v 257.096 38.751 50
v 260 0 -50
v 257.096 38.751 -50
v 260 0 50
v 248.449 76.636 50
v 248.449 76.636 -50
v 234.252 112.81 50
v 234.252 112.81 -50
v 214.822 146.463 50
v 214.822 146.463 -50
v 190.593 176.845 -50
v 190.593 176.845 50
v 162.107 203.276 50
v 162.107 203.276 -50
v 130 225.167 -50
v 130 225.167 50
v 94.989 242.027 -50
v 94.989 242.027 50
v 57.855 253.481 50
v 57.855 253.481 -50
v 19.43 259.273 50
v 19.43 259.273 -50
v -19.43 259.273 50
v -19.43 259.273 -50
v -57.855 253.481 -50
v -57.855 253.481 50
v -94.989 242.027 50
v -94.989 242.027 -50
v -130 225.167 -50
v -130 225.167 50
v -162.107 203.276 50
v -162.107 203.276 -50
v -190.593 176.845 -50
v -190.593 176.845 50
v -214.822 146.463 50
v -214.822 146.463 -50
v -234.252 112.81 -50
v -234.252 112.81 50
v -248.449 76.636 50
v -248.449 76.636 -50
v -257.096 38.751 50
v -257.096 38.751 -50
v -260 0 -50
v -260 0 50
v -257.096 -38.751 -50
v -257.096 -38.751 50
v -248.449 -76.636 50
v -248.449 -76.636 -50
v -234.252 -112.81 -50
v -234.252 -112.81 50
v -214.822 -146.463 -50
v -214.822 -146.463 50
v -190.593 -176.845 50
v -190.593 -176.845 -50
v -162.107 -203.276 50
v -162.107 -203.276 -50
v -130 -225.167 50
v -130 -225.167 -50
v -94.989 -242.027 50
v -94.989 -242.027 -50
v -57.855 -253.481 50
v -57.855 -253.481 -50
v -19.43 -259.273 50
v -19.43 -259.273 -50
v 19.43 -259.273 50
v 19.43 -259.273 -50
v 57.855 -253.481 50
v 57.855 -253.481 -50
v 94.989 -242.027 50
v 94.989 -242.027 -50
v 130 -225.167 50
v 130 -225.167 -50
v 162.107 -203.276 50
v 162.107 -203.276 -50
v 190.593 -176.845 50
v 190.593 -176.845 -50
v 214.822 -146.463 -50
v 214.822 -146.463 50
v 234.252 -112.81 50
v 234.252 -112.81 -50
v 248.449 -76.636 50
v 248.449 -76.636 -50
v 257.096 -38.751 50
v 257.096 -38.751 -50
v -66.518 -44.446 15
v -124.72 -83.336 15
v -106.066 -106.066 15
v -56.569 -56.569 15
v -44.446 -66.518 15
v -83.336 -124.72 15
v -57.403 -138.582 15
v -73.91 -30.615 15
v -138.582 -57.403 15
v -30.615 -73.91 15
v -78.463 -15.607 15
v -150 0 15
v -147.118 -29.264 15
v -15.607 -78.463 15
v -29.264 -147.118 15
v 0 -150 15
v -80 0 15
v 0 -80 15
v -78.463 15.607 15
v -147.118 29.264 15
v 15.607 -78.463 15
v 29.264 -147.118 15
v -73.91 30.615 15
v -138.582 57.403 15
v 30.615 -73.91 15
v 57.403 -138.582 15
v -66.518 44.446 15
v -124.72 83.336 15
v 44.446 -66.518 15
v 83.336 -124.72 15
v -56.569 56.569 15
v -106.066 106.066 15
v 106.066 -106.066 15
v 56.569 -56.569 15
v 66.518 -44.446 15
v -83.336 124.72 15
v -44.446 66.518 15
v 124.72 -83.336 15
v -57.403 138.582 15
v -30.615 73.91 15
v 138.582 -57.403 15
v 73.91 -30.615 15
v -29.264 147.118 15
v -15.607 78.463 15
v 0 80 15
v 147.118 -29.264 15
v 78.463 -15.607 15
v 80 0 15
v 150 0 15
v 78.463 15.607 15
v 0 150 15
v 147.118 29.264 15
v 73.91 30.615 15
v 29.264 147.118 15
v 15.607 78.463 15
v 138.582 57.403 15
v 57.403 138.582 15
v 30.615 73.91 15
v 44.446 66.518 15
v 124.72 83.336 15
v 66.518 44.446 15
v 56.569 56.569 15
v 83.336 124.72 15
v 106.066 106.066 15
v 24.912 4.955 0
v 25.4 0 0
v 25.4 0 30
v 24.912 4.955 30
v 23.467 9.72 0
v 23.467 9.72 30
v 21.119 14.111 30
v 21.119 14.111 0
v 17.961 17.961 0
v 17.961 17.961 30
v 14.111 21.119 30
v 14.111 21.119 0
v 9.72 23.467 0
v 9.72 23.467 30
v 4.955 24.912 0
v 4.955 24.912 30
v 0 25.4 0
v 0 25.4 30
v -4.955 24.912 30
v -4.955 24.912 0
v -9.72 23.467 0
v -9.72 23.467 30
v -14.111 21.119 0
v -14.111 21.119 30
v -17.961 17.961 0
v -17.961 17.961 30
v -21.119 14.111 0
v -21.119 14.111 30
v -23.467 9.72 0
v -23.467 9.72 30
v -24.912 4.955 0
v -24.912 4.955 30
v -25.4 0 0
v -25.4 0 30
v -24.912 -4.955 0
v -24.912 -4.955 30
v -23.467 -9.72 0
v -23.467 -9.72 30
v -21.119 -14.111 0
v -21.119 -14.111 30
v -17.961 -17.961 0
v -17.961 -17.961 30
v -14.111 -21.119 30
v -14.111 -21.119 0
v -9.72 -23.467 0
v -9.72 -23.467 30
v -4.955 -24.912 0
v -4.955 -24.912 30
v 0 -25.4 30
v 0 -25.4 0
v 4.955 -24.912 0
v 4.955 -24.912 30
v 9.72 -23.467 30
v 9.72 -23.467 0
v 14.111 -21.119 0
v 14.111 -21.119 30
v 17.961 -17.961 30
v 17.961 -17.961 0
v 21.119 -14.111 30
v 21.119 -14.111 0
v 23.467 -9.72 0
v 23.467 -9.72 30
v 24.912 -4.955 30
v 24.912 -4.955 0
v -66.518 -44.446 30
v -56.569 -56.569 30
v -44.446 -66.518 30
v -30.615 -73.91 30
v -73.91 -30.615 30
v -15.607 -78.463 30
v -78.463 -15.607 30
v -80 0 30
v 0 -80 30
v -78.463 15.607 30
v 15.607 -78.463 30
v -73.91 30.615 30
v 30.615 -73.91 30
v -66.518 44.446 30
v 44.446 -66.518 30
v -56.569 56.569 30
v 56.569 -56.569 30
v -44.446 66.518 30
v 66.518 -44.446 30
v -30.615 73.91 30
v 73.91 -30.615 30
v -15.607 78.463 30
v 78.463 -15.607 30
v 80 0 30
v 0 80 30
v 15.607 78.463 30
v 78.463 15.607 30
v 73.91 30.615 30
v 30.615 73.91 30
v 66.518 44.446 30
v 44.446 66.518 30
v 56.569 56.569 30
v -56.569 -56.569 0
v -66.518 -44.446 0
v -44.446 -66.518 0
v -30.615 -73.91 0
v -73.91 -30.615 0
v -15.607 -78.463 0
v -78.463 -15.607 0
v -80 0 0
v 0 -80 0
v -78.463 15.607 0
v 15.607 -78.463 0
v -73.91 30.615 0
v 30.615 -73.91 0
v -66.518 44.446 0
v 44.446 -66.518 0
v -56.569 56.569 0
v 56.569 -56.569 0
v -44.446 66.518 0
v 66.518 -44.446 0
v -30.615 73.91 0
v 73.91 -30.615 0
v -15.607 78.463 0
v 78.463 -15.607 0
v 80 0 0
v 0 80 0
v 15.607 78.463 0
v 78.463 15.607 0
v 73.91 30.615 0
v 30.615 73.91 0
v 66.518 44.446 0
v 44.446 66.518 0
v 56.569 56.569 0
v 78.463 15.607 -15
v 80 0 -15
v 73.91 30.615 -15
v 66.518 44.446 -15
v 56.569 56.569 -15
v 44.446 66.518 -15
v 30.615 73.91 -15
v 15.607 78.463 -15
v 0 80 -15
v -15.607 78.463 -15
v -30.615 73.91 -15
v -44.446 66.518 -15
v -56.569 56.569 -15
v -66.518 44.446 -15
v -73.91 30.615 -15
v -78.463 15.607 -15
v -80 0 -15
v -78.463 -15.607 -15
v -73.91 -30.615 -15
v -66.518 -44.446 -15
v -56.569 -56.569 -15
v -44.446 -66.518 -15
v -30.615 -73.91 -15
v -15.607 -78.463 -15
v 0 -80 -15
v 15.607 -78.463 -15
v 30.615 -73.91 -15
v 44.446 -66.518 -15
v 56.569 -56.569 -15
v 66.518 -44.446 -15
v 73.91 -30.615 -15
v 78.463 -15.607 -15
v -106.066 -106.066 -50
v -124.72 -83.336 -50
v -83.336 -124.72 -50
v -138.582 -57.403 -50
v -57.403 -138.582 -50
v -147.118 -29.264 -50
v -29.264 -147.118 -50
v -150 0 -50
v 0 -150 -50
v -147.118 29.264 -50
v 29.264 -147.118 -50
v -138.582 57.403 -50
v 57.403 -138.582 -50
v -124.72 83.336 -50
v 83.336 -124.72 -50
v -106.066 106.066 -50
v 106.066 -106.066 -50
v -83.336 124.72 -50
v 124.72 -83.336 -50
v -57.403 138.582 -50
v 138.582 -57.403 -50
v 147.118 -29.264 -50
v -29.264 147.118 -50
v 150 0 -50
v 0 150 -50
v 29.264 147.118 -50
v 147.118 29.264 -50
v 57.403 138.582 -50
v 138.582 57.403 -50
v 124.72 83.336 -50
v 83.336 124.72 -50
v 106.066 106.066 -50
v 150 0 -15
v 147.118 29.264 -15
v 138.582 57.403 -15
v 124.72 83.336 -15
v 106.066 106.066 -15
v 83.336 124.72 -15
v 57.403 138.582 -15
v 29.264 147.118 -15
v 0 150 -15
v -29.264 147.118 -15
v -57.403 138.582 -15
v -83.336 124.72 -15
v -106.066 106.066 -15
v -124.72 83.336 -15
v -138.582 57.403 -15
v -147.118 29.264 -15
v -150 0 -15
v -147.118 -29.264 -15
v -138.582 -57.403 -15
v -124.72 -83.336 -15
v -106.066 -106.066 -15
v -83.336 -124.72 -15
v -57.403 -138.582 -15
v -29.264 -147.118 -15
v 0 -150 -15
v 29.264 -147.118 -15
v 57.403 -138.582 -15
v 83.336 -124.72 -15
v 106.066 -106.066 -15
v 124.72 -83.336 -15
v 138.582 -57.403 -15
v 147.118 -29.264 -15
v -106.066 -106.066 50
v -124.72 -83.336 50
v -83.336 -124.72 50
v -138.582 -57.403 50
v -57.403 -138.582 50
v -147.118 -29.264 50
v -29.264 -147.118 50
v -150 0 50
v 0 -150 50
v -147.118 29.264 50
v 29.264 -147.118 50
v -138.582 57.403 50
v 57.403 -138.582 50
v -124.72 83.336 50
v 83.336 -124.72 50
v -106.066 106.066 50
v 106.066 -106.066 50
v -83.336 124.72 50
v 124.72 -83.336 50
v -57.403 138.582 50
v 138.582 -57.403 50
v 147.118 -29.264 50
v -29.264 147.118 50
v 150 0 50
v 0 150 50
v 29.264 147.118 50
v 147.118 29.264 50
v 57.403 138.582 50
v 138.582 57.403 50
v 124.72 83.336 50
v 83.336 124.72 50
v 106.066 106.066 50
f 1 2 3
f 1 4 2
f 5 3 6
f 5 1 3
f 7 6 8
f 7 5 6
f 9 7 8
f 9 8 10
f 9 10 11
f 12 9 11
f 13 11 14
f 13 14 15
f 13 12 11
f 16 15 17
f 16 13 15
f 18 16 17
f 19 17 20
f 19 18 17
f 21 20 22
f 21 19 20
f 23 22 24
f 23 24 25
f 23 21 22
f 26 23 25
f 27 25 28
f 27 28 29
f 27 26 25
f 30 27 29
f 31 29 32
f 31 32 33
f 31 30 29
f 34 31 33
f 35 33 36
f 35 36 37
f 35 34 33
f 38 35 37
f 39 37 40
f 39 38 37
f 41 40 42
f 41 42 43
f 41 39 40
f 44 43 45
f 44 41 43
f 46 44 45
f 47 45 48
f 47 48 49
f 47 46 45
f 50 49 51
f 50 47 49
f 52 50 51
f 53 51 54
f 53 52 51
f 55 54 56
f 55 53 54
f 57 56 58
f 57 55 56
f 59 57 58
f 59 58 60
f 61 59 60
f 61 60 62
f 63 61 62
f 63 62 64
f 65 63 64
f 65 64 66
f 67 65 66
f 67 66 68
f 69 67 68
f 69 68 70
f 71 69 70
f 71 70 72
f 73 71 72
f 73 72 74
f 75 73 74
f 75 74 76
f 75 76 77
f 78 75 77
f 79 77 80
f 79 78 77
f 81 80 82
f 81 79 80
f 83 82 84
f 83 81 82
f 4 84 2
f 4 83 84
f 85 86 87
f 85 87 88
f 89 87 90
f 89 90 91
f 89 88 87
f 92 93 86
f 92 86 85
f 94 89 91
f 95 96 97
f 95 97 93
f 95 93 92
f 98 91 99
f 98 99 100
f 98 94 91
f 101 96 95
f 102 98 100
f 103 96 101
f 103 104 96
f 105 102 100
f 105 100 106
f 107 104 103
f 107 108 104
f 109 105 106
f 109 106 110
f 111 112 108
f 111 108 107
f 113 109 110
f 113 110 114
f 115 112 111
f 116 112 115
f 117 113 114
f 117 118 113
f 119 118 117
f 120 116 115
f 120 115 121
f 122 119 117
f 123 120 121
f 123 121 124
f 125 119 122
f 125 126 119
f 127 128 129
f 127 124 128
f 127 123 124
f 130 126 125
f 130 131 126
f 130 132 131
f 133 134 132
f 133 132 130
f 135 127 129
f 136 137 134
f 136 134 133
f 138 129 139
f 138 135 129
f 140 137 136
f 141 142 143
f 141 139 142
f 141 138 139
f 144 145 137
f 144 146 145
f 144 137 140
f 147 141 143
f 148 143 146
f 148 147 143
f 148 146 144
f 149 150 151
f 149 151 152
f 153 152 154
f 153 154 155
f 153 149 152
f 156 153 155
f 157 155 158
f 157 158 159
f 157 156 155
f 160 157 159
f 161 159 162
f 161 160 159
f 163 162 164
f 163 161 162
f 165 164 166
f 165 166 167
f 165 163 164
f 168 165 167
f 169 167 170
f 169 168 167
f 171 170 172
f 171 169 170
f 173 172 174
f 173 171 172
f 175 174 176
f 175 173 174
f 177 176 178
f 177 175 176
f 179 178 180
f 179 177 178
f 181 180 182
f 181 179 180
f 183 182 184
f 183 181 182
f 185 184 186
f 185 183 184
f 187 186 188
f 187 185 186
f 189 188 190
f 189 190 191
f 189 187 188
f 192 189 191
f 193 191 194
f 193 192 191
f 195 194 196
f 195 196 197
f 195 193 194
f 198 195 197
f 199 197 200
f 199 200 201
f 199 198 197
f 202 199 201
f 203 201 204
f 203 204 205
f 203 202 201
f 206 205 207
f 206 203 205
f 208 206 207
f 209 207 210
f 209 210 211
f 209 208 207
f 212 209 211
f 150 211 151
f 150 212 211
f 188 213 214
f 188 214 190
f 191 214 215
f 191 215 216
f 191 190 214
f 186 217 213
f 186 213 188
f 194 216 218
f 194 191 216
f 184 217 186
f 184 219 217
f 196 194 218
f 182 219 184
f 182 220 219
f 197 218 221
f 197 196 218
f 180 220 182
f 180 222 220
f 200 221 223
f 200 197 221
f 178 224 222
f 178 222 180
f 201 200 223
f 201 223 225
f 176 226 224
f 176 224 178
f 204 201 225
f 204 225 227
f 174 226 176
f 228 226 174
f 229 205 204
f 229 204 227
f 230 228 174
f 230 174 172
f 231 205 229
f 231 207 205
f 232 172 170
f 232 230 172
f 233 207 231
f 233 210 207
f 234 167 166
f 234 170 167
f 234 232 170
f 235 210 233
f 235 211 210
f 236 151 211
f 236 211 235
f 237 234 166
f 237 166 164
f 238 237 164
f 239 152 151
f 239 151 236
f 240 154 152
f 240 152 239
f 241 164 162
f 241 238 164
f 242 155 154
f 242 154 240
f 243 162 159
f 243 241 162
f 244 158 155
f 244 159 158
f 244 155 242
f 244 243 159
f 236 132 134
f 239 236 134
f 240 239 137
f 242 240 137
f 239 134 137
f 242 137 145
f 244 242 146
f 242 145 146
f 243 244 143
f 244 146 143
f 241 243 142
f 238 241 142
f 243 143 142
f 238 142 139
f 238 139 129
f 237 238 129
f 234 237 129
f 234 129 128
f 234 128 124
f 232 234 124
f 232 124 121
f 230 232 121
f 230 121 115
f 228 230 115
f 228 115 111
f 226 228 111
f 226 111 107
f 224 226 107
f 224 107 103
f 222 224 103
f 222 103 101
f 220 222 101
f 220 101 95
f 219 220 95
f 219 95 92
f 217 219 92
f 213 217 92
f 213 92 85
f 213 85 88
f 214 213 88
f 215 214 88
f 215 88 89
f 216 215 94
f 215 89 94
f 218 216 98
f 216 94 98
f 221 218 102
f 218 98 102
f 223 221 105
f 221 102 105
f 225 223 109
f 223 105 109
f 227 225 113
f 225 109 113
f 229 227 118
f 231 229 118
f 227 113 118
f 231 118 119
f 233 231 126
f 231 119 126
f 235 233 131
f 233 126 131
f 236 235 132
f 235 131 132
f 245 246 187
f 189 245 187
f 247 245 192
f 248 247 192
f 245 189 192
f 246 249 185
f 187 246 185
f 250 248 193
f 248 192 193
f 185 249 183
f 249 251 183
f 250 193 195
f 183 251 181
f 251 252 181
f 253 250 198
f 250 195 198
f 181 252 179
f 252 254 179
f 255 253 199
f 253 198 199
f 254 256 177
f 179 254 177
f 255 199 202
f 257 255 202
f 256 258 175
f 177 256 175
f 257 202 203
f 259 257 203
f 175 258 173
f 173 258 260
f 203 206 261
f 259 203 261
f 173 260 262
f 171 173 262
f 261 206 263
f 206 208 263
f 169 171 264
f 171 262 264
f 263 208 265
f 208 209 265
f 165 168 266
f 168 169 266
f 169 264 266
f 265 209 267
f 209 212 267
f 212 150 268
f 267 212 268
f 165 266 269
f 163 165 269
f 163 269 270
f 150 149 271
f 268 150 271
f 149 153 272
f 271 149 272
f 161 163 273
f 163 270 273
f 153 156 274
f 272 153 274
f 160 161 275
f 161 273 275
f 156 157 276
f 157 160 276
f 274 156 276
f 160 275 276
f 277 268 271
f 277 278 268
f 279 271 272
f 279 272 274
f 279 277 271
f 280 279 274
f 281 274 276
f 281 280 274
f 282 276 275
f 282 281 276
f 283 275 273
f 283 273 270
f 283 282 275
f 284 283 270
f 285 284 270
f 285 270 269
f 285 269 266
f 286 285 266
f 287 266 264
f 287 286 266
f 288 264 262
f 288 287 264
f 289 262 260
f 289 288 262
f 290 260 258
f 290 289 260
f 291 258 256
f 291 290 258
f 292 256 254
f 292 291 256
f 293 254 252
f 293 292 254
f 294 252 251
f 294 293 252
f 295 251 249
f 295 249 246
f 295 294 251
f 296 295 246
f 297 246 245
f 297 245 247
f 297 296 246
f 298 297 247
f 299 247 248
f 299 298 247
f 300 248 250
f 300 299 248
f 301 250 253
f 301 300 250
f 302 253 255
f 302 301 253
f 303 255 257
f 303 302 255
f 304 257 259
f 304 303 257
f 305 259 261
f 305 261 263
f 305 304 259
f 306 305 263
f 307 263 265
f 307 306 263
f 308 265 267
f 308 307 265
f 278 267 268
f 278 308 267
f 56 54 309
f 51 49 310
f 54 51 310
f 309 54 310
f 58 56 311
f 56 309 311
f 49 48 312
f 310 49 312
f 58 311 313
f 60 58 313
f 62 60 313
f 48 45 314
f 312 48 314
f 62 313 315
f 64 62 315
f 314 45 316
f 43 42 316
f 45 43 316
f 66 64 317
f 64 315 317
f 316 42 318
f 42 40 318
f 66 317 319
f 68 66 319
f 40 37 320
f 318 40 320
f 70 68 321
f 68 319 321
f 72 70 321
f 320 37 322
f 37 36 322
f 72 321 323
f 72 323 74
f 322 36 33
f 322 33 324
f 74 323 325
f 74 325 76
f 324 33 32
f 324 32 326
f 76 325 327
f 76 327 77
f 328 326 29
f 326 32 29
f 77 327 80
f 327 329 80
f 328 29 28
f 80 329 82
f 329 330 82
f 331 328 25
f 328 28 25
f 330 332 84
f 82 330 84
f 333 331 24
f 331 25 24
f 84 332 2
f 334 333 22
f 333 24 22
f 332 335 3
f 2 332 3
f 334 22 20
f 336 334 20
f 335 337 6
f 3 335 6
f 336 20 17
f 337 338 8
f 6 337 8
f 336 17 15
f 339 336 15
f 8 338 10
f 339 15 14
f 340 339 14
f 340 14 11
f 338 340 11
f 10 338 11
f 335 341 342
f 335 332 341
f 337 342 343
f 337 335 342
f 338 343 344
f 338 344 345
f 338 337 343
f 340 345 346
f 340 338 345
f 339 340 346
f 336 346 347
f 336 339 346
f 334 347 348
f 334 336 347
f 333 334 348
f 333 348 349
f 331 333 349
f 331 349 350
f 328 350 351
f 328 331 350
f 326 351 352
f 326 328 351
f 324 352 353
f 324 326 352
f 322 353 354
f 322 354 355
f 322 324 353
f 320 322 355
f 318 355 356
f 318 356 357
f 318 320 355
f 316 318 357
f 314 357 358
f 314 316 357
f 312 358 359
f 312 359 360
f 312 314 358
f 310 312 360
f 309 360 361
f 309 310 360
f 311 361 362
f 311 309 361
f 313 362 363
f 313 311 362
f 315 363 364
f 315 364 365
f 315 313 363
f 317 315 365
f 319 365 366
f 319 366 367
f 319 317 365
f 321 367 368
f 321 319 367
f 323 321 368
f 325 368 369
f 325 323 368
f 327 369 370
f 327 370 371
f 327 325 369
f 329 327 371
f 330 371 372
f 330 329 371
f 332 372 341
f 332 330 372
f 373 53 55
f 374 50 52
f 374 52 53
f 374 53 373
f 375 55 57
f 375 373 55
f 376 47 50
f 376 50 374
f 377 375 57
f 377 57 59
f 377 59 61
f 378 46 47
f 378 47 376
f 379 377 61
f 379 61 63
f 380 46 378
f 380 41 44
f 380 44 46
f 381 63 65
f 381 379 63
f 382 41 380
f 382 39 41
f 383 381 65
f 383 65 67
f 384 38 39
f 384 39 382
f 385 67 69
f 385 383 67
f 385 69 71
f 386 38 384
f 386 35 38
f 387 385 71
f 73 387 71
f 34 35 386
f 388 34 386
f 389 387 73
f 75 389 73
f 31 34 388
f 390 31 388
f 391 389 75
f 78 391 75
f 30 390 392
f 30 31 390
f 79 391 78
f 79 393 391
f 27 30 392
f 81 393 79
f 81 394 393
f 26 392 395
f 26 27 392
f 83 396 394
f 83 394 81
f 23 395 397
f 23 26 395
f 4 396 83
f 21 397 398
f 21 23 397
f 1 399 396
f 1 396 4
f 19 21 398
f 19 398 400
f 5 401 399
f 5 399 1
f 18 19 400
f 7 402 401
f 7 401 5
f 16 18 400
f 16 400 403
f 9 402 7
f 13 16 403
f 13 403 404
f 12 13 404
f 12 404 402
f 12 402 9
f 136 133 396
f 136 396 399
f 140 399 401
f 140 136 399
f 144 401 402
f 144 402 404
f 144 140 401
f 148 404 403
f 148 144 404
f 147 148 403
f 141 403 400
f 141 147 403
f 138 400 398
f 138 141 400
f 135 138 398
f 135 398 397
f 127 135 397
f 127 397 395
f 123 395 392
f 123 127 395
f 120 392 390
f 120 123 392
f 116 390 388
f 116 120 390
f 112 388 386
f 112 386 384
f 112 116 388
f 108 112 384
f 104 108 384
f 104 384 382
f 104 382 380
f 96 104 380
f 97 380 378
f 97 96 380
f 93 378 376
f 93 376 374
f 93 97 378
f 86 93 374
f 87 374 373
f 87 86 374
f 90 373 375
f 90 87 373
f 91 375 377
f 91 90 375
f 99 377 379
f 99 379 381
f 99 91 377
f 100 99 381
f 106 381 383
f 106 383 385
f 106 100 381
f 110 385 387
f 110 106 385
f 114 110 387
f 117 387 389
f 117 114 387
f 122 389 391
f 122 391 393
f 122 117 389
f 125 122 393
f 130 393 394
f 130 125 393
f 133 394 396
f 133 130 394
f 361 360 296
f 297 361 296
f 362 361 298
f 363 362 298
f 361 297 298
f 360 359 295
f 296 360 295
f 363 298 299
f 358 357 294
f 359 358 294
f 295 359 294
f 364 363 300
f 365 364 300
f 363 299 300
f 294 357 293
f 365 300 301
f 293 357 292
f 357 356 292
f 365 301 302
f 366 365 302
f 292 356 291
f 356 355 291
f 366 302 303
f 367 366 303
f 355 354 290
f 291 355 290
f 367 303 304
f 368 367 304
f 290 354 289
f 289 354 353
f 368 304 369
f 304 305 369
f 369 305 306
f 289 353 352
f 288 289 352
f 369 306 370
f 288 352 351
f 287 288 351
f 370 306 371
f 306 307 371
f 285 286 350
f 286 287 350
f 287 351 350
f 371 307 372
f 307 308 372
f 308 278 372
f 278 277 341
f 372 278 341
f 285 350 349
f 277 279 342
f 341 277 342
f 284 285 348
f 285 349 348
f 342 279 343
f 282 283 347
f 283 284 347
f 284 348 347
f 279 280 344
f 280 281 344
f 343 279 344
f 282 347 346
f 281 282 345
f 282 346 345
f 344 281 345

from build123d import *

# Parameters (mm, degrees)
CROQUIS1_R              = 260
CROQUIS1_R_2            = 150
SALIENTE_EXTRUIR1_DEPTH = 50
CROQUIS1_3_R            = 150
CROQUIS1_3_R_2          = 80
SALIENTE_EXTRUIR2_DEPTH = 15
CROQUIS1_4_R            = 80
CROQUIS1_4_R_2          = 25.4
SALIENTE_EXTRUIR3_DEPTH = 30


with BuildPart() as part:
    # Croquis1 → Saliente-Extruir1 (new, symmetric)
    with BuildSketch(Plane.XY):
        Circle(CROQUIS1_R)
        Circle(CROQUIS1_R_2, mode=Mode.SUBTRACT)
    extrude(amount=SALIENTE_EXTRUIR1_DEPTH, both=True)

    # Croquis1<3> → Saliente-Extruir2 (add, symmetric)
    with BuildSketch(Plane.XY):
        Circle(CROQUIS1_3_R)
        Circle(CROQUIS1_3_R_2, mode=Mode.SUBTRACT)
    extrude(amount=SALIENTE_EXTRUIR2_DEPTH, both=True)

    # Croquis1<4> → Saliente-Extruir3 (add)
    with BuildSketch(Plane.XY):
        Circle(CROQUIS1_4_R)
        Circle(CROQUIS1_4_R_2, mode=Mode.SUBTRACT)
    extrude(amount=SALIENTE_EXTRUIR3_DEPTH)


solid = part.part
